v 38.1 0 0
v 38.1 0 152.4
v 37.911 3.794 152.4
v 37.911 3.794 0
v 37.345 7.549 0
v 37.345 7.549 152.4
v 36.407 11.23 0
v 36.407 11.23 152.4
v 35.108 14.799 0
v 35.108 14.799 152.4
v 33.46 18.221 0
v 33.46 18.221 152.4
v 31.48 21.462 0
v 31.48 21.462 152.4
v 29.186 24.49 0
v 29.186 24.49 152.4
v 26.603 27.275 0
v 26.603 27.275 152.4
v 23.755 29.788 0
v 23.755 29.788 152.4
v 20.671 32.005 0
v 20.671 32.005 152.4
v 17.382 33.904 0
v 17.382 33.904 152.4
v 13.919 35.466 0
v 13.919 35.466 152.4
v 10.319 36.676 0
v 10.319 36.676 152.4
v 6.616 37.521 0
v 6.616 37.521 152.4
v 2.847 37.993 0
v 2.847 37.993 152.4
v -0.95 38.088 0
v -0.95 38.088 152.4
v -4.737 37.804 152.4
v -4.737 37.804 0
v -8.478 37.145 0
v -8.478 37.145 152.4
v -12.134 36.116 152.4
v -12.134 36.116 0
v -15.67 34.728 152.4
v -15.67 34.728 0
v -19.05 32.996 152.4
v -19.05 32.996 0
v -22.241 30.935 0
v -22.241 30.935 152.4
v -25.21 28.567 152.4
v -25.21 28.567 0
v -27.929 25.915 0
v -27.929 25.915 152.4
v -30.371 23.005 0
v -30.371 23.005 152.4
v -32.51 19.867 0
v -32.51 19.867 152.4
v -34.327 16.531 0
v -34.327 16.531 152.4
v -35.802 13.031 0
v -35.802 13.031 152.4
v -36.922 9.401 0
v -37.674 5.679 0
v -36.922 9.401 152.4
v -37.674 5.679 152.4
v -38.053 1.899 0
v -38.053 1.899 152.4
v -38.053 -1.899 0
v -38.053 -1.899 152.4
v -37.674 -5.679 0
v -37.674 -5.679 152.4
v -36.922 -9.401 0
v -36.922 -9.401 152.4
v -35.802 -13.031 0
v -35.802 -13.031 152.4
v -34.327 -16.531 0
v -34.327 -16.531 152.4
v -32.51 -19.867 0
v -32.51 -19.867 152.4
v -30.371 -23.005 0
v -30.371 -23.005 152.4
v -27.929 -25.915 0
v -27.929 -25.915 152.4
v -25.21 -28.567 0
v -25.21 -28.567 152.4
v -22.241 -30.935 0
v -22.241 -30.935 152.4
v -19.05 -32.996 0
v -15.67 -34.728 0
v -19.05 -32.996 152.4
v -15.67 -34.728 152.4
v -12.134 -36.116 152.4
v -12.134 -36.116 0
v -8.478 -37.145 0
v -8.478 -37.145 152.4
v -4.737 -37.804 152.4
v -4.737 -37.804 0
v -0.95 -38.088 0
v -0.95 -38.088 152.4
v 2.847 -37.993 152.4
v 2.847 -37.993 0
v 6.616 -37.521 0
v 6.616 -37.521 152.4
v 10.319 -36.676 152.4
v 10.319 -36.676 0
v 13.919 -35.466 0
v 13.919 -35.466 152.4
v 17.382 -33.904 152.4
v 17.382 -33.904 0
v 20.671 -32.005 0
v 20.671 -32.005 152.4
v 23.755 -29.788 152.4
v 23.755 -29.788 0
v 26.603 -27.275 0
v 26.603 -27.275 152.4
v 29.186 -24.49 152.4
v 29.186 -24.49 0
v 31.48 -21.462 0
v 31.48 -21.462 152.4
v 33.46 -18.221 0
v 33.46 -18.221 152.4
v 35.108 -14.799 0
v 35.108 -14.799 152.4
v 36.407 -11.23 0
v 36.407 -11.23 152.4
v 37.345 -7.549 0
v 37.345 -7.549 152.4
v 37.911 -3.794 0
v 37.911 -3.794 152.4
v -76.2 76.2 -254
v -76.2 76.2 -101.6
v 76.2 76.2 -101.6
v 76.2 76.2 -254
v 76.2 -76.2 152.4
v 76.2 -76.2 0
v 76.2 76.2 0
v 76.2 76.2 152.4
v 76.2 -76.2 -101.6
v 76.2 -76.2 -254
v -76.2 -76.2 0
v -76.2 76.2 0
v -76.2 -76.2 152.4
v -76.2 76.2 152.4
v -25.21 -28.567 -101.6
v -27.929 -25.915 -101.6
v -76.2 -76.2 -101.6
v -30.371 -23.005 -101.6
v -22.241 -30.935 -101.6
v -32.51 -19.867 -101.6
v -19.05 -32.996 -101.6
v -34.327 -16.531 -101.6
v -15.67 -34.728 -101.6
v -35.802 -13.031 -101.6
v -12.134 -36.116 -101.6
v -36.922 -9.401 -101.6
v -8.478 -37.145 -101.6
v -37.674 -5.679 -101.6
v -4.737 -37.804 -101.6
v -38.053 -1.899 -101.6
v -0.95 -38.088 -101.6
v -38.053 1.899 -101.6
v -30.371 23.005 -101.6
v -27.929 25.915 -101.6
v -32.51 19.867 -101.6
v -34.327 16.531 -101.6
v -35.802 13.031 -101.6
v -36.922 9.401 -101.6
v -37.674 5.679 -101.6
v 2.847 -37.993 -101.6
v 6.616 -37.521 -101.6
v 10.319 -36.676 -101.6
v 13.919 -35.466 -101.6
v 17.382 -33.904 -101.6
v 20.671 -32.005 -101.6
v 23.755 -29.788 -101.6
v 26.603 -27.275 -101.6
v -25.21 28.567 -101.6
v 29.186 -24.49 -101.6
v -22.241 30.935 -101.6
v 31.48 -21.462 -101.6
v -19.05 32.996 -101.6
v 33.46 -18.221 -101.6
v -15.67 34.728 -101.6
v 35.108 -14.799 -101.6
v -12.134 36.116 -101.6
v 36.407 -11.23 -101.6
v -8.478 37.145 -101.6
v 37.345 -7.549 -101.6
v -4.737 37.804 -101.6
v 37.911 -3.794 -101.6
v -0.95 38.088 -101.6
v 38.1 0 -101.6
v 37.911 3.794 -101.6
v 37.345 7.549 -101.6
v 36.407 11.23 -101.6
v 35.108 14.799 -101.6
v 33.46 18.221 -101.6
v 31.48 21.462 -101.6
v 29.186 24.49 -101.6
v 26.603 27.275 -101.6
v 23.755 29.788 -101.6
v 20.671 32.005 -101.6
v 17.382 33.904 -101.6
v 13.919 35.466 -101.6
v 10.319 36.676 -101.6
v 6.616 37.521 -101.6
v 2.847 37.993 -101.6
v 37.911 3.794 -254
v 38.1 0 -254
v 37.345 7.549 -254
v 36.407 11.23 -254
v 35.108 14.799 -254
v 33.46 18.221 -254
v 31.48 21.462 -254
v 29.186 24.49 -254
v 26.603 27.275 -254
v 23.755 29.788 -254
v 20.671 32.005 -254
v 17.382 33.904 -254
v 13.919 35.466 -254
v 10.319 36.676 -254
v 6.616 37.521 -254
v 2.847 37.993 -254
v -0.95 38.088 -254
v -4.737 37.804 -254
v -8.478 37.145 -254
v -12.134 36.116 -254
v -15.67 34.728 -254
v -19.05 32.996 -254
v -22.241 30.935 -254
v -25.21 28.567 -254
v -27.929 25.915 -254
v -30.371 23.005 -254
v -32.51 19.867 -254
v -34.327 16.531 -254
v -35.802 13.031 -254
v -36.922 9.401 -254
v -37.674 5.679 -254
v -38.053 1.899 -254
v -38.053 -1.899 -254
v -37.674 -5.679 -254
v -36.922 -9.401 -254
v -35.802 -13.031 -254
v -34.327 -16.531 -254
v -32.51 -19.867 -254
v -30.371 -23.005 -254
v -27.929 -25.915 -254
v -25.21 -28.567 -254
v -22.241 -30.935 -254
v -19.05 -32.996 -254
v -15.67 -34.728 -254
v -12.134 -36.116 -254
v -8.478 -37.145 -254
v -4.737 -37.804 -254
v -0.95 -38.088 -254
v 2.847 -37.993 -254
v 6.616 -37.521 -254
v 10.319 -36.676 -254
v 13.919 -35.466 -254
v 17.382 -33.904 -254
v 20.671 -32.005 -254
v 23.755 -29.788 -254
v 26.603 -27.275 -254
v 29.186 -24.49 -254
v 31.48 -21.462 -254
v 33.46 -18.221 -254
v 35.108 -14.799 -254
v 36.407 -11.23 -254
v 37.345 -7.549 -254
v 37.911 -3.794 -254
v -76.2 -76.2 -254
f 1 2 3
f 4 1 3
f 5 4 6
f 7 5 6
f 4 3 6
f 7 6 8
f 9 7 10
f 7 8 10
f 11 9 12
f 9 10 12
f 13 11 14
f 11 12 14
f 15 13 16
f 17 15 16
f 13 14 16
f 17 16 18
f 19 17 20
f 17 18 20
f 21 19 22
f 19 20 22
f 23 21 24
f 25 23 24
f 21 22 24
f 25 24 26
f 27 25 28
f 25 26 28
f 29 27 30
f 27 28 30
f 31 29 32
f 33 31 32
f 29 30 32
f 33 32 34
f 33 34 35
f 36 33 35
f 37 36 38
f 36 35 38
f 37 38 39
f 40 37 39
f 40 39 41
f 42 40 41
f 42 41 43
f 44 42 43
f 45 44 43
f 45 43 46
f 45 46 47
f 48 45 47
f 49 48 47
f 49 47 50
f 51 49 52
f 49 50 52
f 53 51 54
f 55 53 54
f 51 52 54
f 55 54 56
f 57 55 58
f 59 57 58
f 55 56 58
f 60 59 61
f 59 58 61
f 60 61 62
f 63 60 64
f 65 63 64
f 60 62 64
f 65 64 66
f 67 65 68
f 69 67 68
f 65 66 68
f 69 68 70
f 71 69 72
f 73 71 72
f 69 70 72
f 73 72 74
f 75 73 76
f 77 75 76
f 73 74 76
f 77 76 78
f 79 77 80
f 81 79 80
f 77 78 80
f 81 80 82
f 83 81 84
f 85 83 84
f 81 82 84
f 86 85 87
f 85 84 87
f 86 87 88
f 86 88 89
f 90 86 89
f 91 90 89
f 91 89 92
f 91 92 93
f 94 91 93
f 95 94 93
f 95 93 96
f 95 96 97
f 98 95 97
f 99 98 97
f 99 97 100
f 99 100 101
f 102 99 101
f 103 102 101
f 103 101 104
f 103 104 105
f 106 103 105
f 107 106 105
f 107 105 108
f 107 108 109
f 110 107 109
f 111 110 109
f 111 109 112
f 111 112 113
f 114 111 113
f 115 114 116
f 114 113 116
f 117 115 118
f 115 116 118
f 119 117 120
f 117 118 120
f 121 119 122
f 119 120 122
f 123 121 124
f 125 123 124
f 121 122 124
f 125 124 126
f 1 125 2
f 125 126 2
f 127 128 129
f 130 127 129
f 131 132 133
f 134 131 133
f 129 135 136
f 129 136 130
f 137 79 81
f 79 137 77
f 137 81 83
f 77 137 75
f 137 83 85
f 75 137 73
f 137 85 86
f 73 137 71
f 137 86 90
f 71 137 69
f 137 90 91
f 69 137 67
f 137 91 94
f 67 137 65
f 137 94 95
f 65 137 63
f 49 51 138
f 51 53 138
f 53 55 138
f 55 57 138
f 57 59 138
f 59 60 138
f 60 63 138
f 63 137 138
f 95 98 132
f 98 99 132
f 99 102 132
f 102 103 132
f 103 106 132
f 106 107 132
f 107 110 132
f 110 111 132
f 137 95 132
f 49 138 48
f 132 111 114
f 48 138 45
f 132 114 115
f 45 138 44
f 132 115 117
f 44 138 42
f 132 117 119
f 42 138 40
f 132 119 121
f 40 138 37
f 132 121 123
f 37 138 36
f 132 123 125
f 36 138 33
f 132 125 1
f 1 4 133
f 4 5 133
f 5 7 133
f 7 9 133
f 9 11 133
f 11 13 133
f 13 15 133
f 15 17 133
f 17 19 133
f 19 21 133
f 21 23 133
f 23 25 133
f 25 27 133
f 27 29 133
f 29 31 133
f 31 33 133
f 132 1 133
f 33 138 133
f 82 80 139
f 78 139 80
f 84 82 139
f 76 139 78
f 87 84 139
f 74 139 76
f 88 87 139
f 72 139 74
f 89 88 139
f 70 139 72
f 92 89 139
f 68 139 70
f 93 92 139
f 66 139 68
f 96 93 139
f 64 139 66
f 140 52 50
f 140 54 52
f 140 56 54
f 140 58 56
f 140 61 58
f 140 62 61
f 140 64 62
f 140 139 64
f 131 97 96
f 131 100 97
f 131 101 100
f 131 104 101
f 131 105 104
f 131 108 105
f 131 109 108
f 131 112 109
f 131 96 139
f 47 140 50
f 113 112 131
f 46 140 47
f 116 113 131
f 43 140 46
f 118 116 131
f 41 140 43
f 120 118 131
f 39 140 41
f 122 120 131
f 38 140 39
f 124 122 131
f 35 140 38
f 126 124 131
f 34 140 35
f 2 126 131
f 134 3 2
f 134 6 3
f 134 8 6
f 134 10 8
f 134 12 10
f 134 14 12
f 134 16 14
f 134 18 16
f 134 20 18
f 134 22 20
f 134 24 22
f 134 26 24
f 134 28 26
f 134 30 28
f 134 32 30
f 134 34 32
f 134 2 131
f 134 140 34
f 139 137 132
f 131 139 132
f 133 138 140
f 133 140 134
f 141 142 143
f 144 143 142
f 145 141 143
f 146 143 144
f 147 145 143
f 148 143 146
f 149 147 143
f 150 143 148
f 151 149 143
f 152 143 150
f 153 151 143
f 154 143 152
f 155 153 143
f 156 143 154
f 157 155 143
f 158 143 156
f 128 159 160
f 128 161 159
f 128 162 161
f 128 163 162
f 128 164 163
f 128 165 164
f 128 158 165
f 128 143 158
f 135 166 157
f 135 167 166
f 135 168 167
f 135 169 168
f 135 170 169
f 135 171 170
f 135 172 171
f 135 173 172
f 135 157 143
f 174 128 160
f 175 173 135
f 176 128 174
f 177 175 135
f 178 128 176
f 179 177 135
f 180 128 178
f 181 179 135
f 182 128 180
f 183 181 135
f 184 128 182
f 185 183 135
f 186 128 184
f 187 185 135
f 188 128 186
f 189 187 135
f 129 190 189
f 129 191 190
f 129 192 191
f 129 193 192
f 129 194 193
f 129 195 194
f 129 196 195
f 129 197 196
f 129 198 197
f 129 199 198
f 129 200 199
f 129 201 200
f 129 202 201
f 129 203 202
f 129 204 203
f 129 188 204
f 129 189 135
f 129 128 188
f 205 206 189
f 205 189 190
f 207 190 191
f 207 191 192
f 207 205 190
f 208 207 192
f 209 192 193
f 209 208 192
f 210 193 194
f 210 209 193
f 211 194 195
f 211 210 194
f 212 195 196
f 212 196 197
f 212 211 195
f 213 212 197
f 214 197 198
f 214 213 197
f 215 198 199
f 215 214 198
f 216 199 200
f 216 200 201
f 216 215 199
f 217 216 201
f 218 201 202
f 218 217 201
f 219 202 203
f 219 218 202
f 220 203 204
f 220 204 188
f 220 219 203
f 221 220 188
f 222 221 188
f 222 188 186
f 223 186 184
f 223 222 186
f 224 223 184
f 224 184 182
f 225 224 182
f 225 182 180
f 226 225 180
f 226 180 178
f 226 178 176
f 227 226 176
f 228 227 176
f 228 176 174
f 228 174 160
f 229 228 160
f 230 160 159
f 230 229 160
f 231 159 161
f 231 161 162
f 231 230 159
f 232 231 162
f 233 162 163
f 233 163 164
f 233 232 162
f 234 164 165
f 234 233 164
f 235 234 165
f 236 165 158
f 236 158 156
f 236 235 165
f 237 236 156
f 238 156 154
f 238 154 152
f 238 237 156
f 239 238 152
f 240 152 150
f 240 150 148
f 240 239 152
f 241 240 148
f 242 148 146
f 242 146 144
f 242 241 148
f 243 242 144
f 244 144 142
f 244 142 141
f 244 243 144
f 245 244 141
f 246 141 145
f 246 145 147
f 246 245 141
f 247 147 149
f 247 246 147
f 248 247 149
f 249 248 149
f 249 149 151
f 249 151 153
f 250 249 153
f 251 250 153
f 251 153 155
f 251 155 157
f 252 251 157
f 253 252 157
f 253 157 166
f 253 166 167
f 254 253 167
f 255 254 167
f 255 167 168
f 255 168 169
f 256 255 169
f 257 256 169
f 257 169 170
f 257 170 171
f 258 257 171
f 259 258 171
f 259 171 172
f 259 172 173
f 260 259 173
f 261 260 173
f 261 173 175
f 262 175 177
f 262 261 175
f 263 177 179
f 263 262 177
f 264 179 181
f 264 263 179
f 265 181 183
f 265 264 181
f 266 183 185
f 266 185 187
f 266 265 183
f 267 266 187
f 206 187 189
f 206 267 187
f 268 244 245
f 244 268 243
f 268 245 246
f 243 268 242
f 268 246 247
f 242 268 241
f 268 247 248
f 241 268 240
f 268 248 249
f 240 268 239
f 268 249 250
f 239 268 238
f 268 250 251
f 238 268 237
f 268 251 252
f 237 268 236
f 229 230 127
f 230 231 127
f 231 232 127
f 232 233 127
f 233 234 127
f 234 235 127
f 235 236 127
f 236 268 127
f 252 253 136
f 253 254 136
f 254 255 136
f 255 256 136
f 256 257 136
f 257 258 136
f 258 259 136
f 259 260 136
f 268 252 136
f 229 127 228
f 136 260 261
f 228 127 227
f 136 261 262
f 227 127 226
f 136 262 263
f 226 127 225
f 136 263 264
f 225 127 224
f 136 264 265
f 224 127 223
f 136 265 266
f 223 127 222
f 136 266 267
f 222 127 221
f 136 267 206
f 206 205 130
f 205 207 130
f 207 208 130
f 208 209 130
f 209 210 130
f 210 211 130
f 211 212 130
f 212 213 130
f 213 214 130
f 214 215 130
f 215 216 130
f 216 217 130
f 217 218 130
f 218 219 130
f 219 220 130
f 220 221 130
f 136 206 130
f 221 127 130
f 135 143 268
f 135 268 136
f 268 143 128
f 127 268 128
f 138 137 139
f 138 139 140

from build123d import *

# Parameters (mm, degrees)
F0_W     = 152.4
F0_H     = 152.4
F1_DEPTH = 152.4
F2_R     = 38.1
F3_DEPTH = 152.4


with BuildPart() as f1:
    # F0 (on Top) → F1 (new body)
    with BuildSketch(Plane.XY):
        Rectangle(F0_W, F0_H)
    extrude(amount=F1_DEPTH)

    # F2 (on face) → F3 (cut, through all)
    with BuildSketch(Plane.XY.offset(152.4)):
        Circle(F2_R)
    extrude(amount=-F3_DEPTH, mode=Mode.SUBTRACT)


with BuildPart() as f5_1:
    # F5: instance of F1
    add(f1.part.mirror(Plane.XY.offset(-50.8)))


solid = Compound([f1.part, f5_1.part])
